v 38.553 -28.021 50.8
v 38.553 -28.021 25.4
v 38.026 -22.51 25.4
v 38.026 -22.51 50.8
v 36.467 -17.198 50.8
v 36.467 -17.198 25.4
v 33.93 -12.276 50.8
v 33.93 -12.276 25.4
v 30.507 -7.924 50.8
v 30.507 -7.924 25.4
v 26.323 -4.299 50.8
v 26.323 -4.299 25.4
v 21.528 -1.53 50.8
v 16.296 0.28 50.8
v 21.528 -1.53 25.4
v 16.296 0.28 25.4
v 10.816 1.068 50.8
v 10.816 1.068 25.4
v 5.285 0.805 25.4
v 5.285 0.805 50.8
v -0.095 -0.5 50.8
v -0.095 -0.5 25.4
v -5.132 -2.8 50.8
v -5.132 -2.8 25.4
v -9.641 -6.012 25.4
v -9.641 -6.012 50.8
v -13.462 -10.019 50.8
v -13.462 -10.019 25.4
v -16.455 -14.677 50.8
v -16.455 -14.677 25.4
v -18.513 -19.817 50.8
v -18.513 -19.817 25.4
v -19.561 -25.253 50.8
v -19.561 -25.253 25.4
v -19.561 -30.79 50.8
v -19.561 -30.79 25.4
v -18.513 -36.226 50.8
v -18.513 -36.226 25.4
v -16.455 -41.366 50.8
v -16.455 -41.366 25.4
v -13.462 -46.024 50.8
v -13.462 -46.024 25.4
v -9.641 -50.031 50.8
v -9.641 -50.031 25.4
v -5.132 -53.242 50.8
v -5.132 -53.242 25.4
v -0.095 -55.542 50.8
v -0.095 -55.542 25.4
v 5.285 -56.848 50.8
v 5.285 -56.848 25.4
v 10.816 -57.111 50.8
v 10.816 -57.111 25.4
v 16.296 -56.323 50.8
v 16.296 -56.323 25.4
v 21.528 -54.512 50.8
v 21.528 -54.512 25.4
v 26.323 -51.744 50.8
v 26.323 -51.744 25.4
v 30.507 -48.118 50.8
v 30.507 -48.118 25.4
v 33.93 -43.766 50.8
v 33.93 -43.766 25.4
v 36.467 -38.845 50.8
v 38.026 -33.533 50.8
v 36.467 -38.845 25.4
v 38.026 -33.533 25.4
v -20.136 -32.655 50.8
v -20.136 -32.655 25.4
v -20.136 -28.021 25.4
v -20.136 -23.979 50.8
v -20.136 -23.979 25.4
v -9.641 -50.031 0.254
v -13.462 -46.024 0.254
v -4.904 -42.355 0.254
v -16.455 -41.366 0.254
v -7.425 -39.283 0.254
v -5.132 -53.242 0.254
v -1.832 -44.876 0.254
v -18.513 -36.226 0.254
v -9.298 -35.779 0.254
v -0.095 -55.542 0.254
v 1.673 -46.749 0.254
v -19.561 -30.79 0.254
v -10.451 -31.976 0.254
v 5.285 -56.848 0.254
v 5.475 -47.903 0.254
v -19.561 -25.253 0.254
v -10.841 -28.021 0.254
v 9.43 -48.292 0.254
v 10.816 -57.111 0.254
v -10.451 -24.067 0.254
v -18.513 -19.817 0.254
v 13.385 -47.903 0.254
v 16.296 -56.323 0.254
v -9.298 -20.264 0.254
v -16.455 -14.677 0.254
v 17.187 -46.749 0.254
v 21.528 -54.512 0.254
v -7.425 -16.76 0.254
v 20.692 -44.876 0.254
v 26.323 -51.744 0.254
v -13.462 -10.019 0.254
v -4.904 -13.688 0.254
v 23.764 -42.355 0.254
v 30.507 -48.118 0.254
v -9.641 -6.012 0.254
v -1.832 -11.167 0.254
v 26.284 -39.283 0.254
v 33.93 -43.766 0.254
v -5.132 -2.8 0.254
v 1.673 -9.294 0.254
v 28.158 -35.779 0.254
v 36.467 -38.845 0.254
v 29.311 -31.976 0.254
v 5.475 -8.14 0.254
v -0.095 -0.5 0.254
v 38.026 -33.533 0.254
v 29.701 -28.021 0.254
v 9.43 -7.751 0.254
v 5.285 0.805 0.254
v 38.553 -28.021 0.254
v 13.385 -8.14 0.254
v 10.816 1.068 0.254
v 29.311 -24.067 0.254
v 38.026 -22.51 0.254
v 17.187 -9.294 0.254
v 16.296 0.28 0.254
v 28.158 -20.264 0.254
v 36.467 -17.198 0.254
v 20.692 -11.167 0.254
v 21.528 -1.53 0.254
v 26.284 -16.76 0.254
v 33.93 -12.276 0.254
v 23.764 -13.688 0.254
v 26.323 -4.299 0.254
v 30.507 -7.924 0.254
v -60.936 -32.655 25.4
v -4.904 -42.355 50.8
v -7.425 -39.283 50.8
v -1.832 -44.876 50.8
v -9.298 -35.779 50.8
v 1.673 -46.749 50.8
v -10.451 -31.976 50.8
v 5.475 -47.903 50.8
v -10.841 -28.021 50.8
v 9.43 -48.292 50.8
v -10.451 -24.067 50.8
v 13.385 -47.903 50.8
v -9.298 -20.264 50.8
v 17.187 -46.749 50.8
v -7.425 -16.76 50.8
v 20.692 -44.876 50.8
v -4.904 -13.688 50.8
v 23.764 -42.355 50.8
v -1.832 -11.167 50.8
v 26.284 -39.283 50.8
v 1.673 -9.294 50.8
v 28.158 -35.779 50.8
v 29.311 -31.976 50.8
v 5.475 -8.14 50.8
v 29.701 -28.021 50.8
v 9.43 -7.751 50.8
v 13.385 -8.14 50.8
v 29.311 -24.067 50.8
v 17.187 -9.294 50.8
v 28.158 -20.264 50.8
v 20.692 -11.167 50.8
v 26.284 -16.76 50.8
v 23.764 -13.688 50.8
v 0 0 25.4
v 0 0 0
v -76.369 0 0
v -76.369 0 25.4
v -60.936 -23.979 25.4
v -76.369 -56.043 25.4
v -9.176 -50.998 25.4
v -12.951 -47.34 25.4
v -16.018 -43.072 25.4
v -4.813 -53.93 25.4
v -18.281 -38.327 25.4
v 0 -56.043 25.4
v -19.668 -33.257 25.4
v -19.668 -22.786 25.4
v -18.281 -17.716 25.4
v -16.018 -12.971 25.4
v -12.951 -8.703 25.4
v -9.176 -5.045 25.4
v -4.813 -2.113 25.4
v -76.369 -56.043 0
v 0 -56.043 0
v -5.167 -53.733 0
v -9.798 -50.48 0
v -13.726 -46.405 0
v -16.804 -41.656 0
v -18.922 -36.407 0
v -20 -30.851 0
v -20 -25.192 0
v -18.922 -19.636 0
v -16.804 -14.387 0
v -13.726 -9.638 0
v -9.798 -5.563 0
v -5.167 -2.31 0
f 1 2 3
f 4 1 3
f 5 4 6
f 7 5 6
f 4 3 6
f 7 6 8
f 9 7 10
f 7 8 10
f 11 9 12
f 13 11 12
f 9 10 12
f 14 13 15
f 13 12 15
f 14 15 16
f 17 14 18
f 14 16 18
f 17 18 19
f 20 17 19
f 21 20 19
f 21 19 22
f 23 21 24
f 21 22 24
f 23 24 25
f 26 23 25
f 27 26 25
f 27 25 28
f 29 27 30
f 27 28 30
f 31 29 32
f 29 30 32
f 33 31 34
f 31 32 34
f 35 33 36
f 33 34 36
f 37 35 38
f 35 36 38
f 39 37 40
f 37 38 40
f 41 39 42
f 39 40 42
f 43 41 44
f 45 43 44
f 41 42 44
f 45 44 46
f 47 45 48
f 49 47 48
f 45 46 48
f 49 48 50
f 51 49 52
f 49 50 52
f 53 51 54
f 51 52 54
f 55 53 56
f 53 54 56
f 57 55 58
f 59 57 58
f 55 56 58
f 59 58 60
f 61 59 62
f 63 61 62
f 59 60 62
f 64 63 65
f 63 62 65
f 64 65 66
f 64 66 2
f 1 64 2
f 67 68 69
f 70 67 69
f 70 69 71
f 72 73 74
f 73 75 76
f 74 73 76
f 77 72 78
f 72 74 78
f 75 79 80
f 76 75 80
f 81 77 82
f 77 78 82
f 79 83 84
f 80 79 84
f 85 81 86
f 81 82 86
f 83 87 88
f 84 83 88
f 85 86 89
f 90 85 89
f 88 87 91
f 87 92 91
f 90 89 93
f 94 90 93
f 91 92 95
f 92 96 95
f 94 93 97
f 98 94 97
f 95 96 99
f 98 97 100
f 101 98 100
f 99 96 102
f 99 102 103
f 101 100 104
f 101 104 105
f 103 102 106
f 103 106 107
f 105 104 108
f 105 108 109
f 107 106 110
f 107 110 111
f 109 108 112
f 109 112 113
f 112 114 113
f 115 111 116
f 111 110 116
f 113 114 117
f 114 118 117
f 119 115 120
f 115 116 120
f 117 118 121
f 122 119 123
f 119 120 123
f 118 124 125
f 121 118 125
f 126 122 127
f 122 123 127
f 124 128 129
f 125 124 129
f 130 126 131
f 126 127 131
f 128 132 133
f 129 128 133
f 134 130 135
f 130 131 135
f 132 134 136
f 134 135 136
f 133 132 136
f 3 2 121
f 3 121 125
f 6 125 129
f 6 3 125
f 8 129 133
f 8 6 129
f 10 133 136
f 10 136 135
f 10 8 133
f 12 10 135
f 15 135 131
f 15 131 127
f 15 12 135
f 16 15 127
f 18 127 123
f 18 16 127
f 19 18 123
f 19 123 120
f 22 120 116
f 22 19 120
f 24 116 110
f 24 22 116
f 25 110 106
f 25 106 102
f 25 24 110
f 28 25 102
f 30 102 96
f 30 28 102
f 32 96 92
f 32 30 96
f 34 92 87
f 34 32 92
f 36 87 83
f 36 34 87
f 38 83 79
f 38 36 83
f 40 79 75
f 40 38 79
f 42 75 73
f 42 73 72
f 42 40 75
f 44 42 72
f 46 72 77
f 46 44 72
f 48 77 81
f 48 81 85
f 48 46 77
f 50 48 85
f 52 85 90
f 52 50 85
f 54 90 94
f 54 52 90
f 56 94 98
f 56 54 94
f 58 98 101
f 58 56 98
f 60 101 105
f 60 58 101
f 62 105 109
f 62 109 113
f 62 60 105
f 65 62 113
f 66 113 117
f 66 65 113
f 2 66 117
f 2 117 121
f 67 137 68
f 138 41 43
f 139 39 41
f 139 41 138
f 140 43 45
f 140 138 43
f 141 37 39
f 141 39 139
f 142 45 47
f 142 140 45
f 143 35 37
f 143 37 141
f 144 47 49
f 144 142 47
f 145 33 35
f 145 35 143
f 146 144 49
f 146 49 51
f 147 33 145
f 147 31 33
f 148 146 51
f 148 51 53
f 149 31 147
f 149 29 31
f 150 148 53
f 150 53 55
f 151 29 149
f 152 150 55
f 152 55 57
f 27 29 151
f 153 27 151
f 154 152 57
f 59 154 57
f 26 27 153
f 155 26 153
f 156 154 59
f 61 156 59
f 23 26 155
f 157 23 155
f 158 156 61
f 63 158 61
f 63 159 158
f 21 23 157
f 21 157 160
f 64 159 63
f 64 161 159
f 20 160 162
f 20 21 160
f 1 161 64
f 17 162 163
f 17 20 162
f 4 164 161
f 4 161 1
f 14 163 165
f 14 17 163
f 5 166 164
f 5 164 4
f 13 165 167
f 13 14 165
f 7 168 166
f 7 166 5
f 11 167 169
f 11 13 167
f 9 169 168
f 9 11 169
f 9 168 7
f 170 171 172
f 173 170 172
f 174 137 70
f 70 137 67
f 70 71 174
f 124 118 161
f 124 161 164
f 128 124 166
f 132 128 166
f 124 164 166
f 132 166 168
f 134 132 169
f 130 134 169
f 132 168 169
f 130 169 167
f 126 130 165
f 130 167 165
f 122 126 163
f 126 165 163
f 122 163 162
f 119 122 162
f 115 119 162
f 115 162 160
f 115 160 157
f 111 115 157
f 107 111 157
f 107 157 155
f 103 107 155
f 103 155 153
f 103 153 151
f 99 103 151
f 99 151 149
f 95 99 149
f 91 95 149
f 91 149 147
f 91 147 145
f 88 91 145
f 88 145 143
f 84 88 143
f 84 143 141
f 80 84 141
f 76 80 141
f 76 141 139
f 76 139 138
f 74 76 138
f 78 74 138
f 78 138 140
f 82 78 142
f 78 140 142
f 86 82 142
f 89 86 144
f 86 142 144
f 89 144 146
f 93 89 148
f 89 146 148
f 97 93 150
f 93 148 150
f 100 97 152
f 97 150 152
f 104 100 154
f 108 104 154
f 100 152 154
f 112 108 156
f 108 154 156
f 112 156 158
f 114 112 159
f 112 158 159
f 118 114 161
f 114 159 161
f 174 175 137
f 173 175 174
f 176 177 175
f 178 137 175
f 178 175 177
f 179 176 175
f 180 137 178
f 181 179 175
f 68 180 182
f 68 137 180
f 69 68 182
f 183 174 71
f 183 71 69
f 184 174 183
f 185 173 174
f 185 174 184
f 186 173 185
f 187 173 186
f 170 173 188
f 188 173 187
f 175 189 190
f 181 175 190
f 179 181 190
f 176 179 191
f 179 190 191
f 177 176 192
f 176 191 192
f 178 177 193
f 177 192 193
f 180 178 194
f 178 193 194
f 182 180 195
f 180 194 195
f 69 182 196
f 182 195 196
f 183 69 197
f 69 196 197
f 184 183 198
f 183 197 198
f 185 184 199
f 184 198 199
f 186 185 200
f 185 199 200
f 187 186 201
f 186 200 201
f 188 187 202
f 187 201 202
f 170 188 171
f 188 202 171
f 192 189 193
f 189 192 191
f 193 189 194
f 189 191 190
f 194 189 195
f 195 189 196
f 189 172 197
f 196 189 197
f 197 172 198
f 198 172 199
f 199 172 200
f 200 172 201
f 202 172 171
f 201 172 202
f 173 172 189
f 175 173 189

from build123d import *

# Parameters (mm, degrees)
F1_DEPTH  = 25.4
F2_R      = 29.122781
F3_DEPTH  = 25.146
F3_FACE_R = 29.122781
F4_DEPTH  = 25.4
F6_DEPTH  = 25.4
F8_DEPTH  = 47.498
F9_R      = 20.270856
F10_DEPTH = 50.8


with BuildPart() as f1:
    # F0 (on Top) → F1 (new body)
    with BuildSketch(Plane.XY):
        with BuildLine():
            Line((0, 0), (-76.369263, 0))
            Line((-76.369263, 0), (-76.369263, -56.042802))
            Line((-76.369263, -56.042802), (0, -56.042802))
            ThreePointArc((0, -56.042802), (-20.135662, -28.021401), (0, 0))
        make_face()
    extrude(amount=F1_DEPTH)

    # F5 (on face) → F6 (join)
    with BuildSketch(Plane.XY.offset(25.4)):
        Polygon((-20.135662, -23.978902), (-60.935609, -23.978902), (-60.935609, -32.654684), (-20.135662, -32.654684), (-20.135662, -28.021401), align=None)
    extrude(amount=F6_DEPTH)

    # F7 (on face) → F8 (cut)
    with BuildSketch(Plane.XZ.offset(32.654684)):
        Polygon((-60.935609, 50.8), (-60.935609, 25.4), (-20.135662, 50.8), align=None)
    extrude(amount=-F8_DEPTH, mode=Mode.SUBTRACT)


with BuildPart() as f3:
    # F2 (on face) → F3 (new body)
    with BuildSketch(Plane.XY.offset(25.4)):
        with Locations((9.429886, -28.021401)):
            Circle(F2_R)
    extrude(amount=-F3_DEPTH)

    # F3_face (on face) → F4 (join)
    with BuildSketch(Plane(origin=(9.429886, -28.021401, 25.4), x_dir=(1, 0, 0), z_dir=(0, 0, 1))):
        Circle(F3_FACE_R)
    extrude(amount=F4_DEPTH)

    # F9 (on face) → F10 (cut)
    with BuildSketch(Plane.XY.offset(50.8)):
        with Locations((9.429886, -28.021401)):
            Circle(F9_R)
    extrude(amount=-F10_DEPTH, mode=Mode.SUBTRACT)


solid = Compound([f1.part, f3.part])
